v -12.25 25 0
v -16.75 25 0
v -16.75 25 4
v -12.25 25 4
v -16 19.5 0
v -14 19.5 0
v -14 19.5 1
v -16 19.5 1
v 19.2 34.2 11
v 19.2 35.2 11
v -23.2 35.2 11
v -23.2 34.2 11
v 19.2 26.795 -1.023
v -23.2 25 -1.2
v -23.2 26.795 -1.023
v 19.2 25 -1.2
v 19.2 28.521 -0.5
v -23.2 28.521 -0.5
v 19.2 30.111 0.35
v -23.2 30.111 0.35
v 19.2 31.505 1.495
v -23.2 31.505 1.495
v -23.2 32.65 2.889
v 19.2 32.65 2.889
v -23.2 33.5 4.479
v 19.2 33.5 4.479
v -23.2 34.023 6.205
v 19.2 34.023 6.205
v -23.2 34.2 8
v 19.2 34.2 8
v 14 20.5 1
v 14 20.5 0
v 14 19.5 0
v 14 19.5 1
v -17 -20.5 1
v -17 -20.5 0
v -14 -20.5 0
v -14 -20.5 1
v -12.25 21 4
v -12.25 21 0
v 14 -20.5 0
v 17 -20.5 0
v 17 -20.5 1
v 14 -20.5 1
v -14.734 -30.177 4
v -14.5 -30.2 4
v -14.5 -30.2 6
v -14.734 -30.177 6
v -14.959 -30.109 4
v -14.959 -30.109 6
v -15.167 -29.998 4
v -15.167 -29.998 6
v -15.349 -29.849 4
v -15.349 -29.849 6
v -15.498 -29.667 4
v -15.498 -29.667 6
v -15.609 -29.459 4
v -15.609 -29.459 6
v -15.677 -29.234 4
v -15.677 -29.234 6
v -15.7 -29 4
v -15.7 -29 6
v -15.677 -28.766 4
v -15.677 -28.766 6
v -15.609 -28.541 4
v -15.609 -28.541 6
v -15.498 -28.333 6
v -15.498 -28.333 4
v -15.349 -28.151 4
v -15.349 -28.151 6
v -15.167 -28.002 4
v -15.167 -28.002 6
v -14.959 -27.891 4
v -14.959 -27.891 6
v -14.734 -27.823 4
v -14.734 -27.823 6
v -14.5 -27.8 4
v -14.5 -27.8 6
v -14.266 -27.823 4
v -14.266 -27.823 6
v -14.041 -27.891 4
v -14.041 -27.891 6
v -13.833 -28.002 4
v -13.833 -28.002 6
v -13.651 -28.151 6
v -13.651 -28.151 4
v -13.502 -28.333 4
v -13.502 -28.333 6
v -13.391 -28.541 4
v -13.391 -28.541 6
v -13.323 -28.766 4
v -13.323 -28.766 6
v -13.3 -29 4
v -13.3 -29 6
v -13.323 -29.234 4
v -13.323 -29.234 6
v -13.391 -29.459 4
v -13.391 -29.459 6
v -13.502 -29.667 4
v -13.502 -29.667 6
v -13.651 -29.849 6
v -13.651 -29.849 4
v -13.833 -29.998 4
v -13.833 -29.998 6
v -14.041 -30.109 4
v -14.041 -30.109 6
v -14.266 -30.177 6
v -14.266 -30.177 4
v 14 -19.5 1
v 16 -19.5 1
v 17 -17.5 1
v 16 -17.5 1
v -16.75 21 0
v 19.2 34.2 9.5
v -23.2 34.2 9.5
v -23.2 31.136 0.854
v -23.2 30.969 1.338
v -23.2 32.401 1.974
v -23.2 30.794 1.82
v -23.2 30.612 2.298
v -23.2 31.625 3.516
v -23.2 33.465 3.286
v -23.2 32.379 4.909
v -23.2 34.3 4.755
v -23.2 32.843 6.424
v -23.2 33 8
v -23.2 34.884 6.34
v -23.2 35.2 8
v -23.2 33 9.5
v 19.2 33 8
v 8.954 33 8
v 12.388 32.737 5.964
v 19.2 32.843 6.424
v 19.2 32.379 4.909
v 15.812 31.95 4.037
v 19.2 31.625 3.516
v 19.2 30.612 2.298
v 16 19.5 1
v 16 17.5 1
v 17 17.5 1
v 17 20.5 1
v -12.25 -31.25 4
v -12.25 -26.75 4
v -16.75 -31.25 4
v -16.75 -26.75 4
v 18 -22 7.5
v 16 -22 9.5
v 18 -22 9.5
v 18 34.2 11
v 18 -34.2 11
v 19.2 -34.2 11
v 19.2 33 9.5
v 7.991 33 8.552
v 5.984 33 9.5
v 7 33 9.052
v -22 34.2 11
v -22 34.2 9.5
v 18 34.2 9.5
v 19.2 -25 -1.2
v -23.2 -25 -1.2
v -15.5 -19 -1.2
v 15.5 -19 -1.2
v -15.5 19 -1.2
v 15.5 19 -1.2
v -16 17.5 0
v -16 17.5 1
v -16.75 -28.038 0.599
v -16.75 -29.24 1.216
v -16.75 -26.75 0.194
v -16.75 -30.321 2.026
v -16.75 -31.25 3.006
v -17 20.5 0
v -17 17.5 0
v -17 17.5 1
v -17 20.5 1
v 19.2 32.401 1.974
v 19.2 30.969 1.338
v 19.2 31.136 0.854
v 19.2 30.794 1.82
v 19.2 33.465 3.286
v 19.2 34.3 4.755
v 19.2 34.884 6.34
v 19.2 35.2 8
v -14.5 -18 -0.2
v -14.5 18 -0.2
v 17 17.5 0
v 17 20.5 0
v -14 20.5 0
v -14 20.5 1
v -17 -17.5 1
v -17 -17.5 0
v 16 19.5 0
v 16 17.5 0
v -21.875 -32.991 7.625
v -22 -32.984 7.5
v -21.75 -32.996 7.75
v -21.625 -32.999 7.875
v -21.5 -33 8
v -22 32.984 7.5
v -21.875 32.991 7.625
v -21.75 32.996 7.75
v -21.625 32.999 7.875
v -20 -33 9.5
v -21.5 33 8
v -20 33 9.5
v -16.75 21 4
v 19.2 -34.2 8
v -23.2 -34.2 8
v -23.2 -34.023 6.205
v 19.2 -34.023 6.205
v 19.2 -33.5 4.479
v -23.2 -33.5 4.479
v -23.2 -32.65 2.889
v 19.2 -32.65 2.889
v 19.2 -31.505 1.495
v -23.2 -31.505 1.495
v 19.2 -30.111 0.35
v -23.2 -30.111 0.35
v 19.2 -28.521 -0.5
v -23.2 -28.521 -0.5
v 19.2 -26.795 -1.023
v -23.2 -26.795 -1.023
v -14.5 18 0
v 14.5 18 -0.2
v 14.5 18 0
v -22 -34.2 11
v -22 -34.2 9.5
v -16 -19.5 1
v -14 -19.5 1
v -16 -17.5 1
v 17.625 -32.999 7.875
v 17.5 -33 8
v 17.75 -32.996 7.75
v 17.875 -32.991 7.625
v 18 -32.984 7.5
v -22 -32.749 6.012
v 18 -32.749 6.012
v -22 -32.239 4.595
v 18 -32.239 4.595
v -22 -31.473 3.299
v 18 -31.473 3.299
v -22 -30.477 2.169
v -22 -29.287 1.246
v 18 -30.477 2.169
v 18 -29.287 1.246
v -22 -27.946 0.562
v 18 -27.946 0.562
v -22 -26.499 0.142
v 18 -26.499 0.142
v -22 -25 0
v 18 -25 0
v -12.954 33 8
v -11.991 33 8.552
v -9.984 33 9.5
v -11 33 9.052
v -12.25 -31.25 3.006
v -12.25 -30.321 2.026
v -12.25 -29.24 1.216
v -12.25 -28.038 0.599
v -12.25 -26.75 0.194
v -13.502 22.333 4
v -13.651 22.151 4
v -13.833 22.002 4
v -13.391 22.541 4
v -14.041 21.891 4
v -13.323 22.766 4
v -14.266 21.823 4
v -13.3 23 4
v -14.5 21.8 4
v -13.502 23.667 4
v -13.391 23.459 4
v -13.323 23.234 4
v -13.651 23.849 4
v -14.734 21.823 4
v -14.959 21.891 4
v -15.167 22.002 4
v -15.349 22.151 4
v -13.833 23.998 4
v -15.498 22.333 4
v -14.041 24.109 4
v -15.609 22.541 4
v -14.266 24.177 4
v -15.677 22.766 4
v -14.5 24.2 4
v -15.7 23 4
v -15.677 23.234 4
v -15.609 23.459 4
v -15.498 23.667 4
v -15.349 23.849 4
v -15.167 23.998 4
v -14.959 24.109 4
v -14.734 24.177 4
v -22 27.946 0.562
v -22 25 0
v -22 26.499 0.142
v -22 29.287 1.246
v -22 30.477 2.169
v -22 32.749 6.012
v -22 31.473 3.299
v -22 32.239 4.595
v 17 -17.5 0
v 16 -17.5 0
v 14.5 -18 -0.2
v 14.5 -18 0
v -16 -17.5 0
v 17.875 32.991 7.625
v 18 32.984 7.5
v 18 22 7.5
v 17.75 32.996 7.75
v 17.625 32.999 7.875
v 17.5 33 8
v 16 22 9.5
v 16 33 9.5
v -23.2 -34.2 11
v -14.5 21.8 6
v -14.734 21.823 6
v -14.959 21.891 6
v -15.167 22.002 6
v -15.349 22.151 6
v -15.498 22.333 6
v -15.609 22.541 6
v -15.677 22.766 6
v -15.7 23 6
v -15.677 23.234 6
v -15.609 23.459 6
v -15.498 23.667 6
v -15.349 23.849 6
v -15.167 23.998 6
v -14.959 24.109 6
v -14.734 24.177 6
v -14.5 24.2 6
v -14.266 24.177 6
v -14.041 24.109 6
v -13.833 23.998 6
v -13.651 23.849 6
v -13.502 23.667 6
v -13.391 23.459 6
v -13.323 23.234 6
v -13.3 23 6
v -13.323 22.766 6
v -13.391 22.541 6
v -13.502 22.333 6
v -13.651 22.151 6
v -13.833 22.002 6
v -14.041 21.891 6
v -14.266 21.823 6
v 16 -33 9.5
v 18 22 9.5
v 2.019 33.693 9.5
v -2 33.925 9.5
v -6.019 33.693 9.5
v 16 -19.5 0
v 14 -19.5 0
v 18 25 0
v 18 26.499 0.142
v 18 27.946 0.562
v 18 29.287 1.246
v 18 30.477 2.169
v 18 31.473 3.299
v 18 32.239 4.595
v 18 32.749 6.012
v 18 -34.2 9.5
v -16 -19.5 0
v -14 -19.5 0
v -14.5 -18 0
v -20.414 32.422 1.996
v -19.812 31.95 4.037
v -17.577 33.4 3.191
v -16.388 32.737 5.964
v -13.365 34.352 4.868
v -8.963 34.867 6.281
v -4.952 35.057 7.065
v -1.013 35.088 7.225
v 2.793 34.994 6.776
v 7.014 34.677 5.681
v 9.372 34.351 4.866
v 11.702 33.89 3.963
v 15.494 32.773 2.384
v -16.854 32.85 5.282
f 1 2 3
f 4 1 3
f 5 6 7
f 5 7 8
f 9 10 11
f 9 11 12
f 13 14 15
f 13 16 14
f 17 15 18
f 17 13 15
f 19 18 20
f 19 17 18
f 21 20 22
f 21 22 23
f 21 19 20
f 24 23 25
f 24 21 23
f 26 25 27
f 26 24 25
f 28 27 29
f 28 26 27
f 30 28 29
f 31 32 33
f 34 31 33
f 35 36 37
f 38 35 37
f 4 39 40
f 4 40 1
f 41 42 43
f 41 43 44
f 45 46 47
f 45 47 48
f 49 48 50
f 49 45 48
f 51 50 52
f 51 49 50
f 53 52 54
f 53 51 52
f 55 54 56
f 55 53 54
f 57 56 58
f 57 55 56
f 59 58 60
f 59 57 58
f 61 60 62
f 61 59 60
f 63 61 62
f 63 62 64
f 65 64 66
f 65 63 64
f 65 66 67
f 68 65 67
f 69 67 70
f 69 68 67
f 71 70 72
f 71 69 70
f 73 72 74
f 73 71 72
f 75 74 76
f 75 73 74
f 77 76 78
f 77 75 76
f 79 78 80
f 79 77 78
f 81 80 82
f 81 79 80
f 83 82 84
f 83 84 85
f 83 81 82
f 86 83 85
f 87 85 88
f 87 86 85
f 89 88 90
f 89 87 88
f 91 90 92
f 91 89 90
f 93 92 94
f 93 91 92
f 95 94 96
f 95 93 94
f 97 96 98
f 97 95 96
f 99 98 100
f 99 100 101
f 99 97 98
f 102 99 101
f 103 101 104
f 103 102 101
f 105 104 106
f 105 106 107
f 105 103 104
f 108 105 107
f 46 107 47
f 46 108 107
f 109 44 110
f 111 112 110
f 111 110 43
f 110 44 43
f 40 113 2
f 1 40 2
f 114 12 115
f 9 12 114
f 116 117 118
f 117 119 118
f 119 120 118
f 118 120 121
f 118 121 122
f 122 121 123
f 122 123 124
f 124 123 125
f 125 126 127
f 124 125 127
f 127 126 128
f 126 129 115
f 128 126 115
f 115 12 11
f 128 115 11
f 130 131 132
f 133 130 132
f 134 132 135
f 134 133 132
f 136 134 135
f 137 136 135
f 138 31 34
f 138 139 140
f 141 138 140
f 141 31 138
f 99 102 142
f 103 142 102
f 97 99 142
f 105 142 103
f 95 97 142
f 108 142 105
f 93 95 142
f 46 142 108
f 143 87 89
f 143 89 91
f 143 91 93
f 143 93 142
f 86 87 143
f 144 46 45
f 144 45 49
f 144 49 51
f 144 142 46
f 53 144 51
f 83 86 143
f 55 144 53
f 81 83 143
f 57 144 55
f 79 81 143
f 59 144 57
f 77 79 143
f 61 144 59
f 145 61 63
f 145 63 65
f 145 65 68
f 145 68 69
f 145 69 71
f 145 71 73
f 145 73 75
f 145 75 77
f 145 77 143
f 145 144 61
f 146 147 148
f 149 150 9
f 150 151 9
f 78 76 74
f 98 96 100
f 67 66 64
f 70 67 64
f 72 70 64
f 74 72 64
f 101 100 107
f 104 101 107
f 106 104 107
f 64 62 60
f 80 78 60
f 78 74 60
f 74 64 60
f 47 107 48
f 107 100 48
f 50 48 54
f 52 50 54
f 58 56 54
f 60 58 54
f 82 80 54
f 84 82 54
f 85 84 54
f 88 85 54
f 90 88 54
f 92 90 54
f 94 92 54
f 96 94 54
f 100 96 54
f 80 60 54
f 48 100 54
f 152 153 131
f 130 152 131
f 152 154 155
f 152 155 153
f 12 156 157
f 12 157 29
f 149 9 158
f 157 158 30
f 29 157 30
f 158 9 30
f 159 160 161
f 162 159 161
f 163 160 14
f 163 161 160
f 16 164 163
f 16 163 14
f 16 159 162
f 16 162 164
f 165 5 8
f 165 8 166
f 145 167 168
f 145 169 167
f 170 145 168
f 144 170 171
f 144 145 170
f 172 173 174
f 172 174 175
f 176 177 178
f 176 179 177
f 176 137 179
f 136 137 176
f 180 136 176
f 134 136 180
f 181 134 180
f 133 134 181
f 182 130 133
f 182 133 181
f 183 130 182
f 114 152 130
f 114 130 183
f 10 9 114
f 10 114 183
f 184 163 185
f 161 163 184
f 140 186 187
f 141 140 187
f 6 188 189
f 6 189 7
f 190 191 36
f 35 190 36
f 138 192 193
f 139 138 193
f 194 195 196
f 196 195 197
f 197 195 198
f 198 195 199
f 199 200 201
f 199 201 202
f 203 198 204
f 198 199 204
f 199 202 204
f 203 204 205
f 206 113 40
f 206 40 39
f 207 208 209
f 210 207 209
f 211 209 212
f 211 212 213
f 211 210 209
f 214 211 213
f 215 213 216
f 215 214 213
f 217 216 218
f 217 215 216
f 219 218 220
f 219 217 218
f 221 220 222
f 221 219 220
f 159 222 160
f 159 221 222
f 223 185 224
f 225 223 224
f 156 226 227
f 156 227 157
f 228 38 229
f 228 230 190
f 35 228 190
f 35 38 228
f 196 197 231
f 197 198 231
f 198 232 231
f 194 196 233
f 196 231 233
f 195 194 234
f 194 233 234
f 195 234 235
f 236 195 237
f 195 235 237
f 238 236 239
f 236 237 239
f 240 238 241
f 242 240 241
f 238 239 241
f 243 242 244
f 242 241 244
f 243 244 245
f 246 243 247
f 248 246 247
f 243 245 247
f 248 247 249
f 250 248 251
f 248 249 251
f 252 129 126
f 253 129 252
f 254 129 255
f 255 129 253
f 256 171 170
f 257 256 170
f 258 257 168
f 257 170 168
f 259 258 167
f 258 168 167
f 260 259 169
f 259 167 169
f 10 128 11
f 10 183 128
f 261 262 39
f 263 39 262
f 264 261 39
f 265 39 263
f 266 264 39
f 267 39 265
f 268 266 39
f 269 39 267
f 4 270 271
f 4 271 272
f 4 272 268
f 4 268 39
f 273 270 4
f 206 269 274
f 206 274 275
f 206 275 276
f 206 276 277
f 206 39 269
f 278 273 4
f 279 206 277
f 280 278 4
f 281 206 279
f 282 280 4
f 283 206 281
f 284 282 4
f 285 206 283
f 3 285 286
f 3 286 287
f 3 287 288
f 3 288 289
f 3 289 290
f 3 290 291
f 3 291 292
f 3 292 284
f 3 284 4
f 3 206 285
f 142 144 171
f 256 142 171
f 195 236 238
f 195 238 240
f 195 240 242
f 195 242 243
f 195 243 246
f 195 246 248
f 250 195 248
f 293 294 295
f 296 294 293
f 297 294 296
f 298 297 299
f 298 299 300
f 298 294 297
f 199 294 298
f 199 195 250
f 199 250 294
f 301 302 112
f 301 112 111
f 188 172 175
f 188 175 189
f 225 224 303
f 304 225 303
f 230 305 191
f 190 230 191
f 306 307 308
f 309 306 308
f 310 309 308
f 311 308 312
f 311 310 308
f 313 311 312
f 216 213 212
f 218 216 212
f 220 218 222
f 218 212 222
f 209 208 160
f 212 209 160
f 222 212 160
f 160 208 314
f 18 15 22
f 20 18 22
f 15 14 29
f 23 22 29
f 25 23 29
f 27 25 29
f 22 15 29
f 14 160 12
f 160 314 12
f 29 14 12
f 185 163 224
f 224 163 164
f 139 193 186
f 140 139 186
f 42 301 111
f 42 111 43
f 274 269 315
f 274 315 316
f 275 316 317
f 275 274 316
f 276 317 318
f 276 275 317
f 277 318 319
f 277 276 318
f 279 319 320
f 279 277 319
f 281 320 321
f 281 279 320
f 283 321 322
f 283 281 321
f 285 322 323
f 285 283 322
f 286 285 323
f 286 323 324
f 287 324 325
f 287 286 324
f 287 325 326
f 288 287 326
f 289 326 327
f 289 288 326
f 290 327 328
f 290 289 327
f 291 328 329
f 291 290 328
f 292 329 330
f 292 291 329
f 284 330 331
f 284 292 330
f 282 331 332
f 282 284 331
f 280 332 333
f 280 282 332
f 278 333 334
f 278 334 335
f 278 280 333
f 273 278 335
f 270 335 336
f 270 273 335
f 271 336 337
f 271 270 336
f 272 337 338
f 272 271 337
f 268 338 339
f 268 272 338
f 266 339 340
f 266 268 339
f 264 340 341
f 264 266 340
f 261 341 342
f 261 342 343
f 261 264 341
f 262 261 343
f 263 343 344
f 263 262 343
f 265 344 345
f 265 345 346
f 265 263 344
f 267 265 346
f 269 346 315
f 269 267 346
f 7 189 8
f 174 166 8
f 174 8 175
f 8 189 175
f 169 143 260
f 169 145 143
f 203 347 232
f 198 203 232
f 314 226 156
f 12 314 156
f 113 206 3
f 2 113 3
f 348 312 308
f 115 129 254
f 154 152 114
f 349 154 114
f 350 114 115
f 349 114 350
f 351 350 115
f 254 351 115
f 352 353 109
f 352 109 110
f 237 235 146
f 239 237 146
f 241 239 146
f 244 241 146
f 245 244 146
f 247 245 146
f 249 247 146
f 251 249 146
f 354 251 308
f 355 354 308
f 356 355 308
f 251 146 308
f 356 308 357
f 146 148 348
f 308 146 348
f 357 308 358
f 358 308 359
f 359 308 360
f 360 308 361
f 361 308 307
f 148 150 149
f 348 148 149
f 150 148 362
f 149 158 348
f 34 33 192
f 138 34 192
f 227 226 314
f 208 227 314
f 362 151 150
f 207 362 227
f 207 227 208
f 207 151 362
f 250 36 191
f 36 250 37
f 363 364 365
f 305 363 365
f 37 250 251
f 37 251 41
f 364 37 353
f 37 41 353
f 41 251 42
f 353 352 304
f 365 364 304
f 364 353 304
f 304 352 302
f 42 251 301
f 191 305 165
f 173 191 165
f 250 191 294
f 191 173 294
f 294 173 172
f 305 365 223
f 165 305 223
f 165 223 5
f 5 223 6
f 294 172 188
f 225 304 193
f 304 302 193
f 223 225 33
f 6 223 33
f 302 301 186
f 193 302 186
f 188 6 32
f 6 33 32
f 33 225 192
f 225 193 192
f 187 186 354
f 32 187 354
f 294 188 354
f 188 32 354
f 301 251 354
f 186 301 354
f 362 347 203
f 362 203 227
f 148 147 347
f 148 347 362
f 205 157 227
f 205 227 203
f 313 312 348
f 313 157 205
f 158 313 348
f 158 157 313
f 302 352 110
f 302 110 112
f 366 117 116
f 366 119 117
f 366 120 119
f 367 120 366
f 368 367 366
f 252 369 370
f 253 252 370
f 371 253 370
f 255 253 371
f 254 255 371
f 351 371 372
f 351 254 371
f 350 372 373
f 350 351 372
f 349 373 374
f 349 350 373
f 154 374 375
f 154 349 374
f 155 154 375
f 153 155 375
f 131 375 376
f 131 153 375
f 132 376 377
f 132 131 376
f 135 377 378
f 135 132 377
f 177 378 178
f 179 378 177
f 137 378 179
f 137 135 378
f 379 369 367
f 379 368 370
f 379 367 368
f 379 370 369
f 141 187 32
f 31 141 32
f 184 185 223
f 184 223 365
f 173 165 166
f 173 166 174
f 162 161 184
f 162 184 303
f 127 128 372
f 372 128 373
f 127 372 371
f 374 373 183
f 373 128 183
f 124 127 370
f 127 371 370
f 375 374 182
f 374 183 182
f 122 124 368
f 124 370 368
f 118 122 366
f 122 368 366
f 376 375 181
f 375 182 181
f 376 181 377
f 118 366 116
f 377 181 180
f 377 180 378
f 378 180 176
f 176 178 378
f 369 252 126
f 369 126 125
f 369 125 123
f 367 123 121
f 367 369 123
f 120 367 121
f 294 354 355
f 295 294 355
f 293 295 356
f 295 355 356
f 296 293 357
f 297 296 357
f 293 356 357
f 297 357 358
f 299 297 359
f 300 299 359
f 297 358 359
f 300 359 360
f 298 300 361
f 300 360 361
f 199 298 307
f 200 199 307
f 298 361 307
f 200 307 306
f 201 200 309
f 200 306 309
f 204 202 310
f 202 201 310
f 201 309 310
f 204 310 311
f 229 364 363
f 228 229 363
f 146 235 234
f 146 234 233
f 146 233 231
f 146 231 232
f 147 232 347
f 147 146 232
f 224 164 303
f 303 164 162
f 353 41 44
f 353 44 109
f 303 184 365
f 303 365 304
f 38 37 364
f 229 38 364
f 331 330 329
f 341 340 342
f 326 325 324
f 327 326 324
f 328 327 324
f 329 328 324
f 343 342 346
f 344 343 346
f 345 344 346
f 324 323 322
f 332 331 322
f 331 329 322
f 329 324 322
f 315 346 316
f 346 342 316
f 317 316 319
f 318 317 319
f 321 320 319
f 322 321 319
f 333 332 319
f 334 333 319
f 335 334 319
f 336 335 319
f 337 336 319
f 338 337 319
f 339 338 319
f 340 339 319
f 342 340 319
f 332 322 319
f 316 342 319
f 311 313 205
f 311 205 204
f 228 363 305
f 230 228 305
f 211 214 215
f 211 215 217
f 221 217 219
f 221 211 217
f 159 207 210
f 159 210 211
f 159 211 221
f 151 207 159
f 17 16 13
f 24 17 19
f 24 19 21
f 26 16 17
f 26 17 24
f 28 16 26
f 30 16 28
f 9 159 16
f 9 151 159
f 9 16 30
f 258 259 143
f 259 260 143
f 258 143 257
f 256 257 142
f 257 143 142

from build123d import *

# Parameters (mm, degrees)
PAD_DEPTH          = 18
PAD_DEPTH_BACK     = 22
THICKNESS_T        = 1.2
SKETCH002_W        = 29
SKETCH002_H        = 36
POCKET_DEPTH       = 12.201
CHAMFER_SIZE       = 1
PAD002_DEPTH       = 1
POLARPATTERN_COUNT = 2
PAD007_DEPTH       = 66
PAD008_DEPTH       = 66
SKETCH010_W        = 2
SKETCH010_H        = 44
POCKET001_DEPTH    = 2
SKETCH011_W        = 40
SKETCH011_H        = 68.4
POCKET002_DEPTH    = 1.5
PAD001_DEPTH       = 19.2
PAD001_DEPTH_BACK  = 23.2
SKETCH012_W        = 1.2
SKETCH012_H        = 42.4
POCKET003_DEPTH    = 1.5
SKETCH004_W        = 4
SKETCH004_H        = 4
PAD004_DEPTH       = 2.25
SKETCH006_R        = 1.2
PAD005_DEPTH       = 2
PAD003_DEPTH       = 2.25
PAD003_DEPTH_BACK  = 2.25
SKETCH007_R        = 1.2
PAD006_DEPTH       = 2


with BuildPart() as cuerpoprincipal:
    # Sketch → Pad (new body, two sides)
    with BuildSketch(Plane.YZ) as pad_sk:
        with BuildLine():
            Line((-25, 0), (25, 0))
            ThreePointArc((25, 0), (30.6568542495, 2.3431457505), (33, 8))
            Line((33, 11), (33, 8))
            Line((-33, 11), (33, 11))
            Line((-33, 11), (-33, 8))
            ThreePointArc((-33, 8), (-30.6568542495, 2.3431457505), (-25, 0))
        make_face()
    extrude(amount=PAD_DEPTH)
    extrude(pad_sk.sketch, amount=-PAD_DEPTH_BACK)

    # Thickness
    thickness_openings = [cuerpoprincipal.faces().sort_by_distance(p)[0] for p in [
        (-2, 0, 11),
    ]]
    offset(amount=THICKNESS_T, openings=thickness_openings, kind=Kind.INTERSECTION)

    # Sketch002 (on Face11 of Thickness) → Pocket (cut, through all)
    with BuildSketch(Plane(origin=(0, 0, -1.2), x_dir=(1, 0, 0), z_dir=(0, 0, -1))):
        Rectangle(SKETCH002_W, SKETCH002_H)
    extrude(amount=-POCKET_DEPTH, mode=Mode.SUBTRACT)

    # Chamfer
    chamfer_edges = [cuerpoprincipal.edges().sort_by_distance(p)[0] for p in [
        (0, 18, -1.2),
        (14.5, 0, -1.2),
        (0, -18, -1.2),
        (-14.5, 0, -1.2),
    ]]
    chamfer(chamfer_edges, length=CHAMFER_SIZE)

    # Sketch003 (on Face17 of Chamfer) → Pad002 (join)
    with BuildSketch(Plane.XY):
        Polygon((-17, 20.5), (-14, 20.5), (-14, 19.5), (-16, 19.5), (-16, 17.5), (-17, 17.5), align=None)
    pad002 = extrude(amount=PAD002_DEPTH)

    # PolarPattern: Pad002 ×2 about axis
    polarpattern_axis = Axis((0, 0, 0), (0, 0, 1))
    for i in range(1, POLARPATTERN_COUNT):
        add(pad002.rotate(polarpattern_axis, i * 360 / POLARPATTERN_COUNT))

    # Mirrored: Pad002 across XZ
    add(pad002.mirror(Plane.XZ))

    # Mirrored001: Pad002 across YZ
    add(pad002.mirror(Plane.YZ))

    # Sketch008 (on Face20 of Mirrored001) → Pad007 (join)
    with BuildSketch(Plane.XZ.offset(-33)):
        Polygon((-22, 7.5), (-20, 9.5), (-22, 9.5), align=None)
    extrude(amount=PAD007_DEPTH)

    # Sketch009 (on Face20 of Pad007) → Pad008 (join)
    with BuildSketch(Plane.XZ.offset(-33)):
        Polygon((16, 9.5), (18, 9.5), (18, 7.5), align=None)
    extrude(amount=PAD008_DEPTH)

    # Sketch010 (on Face53 of Pad008) → Pocket001 (cut)
    with BuildSketch(Plane.XY.offset(9.5)):
        with Locations((17, 0)):
            Rectangle(SKETCH010_W, SKETCH010_H)
    extrude(amount=-POCKET001_DEPTH, mode=Mode.SUBTRACT)

    # Sketch011 (on Face14 of Pocket001) → Pocket002 (cut)
    with BuildSketch(Plane.XY.offset(11)):
        with Locations((-2, 0)):
            Rectangle(SKETCH011_W, SKETCH011_H)
    extrude(amount=-POCKET002_DEPTH, mode=Mode.SUBTRACT)


with BuildPart() as esfera001:
    # Sphere001 → Sphere001 (revolve)
    with BuildSketch(Plane(origin=(-2, 1, -10), x_dir=(1, 0, 0), z_dir=(0, -1, 0))):
        with BuildLine():
            ThreePointArc((0, -40), (40, 0), (0, 40))
            Line((0, 40), (0, -40))
        make_face()
    revolve(axis=Axis((-2, 1, -10), (0, 0, 1)))


with BuildPart() as ala:
    # Sketch001 → Pad001 (new body, two sides)
    with BuildSketch(Plane.YZ) as pad001_sk:
        with BuildLine():
            ThreePointArc((-33, 8), (-30.6568542495, 2.3431457505), (-25, 0))
            Line((-25, 0), (-25, -1.2))
            ThreePointArc((-35.2, 8), (-31.8598089762, 1.4489074394), (-25, -1.2))
            Line((-35.2, 8), (-35.2, 11))
            Line((-35.2, 11), (-33, 11))
            Line((-33, 11), (-33, 8))
        make_face()
    extrude(amount=PAD001_DEPTH)
    extrude(pad001_sk.sketch, amount=-PAD001_DEPTH_BACK)

    # Sketch012 (on Face2 of Pad001) → Pocket003 (cut)
    with BuildSketch(Plane(origin=(0, 0, 11), x_dir=(0, -1, 0), z_dir=(0, 0, 1))):
        with Locations((33.6, -2)):
            Rectangle(SKETCH012_W, SKETCH012_H)
    extrude(amount=-POCKET003_DEPTH, mode=Mode.SUBTRACT)

    # Cut: cut Esfera001
    add(esfera001.part, mode=Mode.SUBTRACT)


with BuildPart() as part_mirroring:
    # Part__Mirroring: instance of ala
    add(ala.part.mirror(Plane(origin=(0, 0, 0), x_dir=(1, 0, 0), z_dir=(0, 1, 0))))


with BuildPart() as soportespantallarecto:
    # Sketch004 → Pad004 (new body, symmetric)
    with BuildSketch(Plane.YZ.offset(14.5)):
        with Locations((23, 2)):
            Rectangle(SKETCH004_W, SKETCH004_H)
    extrude(amount=PAD004_DEPTH, both=True)

    # Sketch006 (on Face1 of Pad004) → Pad005 (join)
    with BuildSketch(Plane(origin=(0, 0, 4), x_dir=(0, -1, 0), z_dir=(0, 0, 1))):
        with Locations((-23, 14.5)):
            Circle(SKETCH006_R)
    extrude(amount=PAD005_DEPTH)


with BuildPart() as part_mirroring001:
    # Part__Mirroring001: instance of SoportesPantallaRecto
    add(soportespantallarecto.part.mirror(Plane(origin=(0, 0, 0), x_dir=(0, -1, 0), z_dir=(1, 0, 0))))


with BuildPart() as soportespantallacurvo:
    # Sketch005 → Pad003 (new body, two sides)
    with BuildSketch(Plane.YZ.offset(14.5)) as pad003_sk:
        with BuildLine():
            Line((-31.25, 4), (-26.7500000001, 4))
            Line((-26.7500000001, 4), (-26.7500000001, 0.193752502))
            ThreePointArc((-31.25, 3.0062539111), (-29.2399930477, 1.2160145228), (-26.7500000001, 0.193752502))
            Line((-31.25, 4), (-31.25, 3.0062539111))
        make_face()
    extrude(amount=PAD003_DEPTH)
    extrude(pad003_sk.sketch, amount=-PAD003_DEPTH_BACK)

    # Sketch007 (on Face1 of Pad003) → Pad006 (join)
    with BuildSketch(Plane(origin=(0, 0, 4), x_dir=(0, -1, 0), z_dir=(0, 0, 1))):
        with Locations((29, 14.5)):
            Circle(SKETCH007_R)
    extrude(amount=PAD006_DEPTH)


with BuildPart() as part_mirroring002:
    # Part__Mirroring002: instance of SoportesPantallaCurvo
    add(soportespantallacurvo.part.mirror(Plane(origin=(0, 0, 0), x_dir=(0, -1, 0), z_dir=(1, 0, 0))))


solid = Compound([cuerpoprincipal.part, part_mirroring.part, part_mirroring001.part, part_mirroring002.part])
